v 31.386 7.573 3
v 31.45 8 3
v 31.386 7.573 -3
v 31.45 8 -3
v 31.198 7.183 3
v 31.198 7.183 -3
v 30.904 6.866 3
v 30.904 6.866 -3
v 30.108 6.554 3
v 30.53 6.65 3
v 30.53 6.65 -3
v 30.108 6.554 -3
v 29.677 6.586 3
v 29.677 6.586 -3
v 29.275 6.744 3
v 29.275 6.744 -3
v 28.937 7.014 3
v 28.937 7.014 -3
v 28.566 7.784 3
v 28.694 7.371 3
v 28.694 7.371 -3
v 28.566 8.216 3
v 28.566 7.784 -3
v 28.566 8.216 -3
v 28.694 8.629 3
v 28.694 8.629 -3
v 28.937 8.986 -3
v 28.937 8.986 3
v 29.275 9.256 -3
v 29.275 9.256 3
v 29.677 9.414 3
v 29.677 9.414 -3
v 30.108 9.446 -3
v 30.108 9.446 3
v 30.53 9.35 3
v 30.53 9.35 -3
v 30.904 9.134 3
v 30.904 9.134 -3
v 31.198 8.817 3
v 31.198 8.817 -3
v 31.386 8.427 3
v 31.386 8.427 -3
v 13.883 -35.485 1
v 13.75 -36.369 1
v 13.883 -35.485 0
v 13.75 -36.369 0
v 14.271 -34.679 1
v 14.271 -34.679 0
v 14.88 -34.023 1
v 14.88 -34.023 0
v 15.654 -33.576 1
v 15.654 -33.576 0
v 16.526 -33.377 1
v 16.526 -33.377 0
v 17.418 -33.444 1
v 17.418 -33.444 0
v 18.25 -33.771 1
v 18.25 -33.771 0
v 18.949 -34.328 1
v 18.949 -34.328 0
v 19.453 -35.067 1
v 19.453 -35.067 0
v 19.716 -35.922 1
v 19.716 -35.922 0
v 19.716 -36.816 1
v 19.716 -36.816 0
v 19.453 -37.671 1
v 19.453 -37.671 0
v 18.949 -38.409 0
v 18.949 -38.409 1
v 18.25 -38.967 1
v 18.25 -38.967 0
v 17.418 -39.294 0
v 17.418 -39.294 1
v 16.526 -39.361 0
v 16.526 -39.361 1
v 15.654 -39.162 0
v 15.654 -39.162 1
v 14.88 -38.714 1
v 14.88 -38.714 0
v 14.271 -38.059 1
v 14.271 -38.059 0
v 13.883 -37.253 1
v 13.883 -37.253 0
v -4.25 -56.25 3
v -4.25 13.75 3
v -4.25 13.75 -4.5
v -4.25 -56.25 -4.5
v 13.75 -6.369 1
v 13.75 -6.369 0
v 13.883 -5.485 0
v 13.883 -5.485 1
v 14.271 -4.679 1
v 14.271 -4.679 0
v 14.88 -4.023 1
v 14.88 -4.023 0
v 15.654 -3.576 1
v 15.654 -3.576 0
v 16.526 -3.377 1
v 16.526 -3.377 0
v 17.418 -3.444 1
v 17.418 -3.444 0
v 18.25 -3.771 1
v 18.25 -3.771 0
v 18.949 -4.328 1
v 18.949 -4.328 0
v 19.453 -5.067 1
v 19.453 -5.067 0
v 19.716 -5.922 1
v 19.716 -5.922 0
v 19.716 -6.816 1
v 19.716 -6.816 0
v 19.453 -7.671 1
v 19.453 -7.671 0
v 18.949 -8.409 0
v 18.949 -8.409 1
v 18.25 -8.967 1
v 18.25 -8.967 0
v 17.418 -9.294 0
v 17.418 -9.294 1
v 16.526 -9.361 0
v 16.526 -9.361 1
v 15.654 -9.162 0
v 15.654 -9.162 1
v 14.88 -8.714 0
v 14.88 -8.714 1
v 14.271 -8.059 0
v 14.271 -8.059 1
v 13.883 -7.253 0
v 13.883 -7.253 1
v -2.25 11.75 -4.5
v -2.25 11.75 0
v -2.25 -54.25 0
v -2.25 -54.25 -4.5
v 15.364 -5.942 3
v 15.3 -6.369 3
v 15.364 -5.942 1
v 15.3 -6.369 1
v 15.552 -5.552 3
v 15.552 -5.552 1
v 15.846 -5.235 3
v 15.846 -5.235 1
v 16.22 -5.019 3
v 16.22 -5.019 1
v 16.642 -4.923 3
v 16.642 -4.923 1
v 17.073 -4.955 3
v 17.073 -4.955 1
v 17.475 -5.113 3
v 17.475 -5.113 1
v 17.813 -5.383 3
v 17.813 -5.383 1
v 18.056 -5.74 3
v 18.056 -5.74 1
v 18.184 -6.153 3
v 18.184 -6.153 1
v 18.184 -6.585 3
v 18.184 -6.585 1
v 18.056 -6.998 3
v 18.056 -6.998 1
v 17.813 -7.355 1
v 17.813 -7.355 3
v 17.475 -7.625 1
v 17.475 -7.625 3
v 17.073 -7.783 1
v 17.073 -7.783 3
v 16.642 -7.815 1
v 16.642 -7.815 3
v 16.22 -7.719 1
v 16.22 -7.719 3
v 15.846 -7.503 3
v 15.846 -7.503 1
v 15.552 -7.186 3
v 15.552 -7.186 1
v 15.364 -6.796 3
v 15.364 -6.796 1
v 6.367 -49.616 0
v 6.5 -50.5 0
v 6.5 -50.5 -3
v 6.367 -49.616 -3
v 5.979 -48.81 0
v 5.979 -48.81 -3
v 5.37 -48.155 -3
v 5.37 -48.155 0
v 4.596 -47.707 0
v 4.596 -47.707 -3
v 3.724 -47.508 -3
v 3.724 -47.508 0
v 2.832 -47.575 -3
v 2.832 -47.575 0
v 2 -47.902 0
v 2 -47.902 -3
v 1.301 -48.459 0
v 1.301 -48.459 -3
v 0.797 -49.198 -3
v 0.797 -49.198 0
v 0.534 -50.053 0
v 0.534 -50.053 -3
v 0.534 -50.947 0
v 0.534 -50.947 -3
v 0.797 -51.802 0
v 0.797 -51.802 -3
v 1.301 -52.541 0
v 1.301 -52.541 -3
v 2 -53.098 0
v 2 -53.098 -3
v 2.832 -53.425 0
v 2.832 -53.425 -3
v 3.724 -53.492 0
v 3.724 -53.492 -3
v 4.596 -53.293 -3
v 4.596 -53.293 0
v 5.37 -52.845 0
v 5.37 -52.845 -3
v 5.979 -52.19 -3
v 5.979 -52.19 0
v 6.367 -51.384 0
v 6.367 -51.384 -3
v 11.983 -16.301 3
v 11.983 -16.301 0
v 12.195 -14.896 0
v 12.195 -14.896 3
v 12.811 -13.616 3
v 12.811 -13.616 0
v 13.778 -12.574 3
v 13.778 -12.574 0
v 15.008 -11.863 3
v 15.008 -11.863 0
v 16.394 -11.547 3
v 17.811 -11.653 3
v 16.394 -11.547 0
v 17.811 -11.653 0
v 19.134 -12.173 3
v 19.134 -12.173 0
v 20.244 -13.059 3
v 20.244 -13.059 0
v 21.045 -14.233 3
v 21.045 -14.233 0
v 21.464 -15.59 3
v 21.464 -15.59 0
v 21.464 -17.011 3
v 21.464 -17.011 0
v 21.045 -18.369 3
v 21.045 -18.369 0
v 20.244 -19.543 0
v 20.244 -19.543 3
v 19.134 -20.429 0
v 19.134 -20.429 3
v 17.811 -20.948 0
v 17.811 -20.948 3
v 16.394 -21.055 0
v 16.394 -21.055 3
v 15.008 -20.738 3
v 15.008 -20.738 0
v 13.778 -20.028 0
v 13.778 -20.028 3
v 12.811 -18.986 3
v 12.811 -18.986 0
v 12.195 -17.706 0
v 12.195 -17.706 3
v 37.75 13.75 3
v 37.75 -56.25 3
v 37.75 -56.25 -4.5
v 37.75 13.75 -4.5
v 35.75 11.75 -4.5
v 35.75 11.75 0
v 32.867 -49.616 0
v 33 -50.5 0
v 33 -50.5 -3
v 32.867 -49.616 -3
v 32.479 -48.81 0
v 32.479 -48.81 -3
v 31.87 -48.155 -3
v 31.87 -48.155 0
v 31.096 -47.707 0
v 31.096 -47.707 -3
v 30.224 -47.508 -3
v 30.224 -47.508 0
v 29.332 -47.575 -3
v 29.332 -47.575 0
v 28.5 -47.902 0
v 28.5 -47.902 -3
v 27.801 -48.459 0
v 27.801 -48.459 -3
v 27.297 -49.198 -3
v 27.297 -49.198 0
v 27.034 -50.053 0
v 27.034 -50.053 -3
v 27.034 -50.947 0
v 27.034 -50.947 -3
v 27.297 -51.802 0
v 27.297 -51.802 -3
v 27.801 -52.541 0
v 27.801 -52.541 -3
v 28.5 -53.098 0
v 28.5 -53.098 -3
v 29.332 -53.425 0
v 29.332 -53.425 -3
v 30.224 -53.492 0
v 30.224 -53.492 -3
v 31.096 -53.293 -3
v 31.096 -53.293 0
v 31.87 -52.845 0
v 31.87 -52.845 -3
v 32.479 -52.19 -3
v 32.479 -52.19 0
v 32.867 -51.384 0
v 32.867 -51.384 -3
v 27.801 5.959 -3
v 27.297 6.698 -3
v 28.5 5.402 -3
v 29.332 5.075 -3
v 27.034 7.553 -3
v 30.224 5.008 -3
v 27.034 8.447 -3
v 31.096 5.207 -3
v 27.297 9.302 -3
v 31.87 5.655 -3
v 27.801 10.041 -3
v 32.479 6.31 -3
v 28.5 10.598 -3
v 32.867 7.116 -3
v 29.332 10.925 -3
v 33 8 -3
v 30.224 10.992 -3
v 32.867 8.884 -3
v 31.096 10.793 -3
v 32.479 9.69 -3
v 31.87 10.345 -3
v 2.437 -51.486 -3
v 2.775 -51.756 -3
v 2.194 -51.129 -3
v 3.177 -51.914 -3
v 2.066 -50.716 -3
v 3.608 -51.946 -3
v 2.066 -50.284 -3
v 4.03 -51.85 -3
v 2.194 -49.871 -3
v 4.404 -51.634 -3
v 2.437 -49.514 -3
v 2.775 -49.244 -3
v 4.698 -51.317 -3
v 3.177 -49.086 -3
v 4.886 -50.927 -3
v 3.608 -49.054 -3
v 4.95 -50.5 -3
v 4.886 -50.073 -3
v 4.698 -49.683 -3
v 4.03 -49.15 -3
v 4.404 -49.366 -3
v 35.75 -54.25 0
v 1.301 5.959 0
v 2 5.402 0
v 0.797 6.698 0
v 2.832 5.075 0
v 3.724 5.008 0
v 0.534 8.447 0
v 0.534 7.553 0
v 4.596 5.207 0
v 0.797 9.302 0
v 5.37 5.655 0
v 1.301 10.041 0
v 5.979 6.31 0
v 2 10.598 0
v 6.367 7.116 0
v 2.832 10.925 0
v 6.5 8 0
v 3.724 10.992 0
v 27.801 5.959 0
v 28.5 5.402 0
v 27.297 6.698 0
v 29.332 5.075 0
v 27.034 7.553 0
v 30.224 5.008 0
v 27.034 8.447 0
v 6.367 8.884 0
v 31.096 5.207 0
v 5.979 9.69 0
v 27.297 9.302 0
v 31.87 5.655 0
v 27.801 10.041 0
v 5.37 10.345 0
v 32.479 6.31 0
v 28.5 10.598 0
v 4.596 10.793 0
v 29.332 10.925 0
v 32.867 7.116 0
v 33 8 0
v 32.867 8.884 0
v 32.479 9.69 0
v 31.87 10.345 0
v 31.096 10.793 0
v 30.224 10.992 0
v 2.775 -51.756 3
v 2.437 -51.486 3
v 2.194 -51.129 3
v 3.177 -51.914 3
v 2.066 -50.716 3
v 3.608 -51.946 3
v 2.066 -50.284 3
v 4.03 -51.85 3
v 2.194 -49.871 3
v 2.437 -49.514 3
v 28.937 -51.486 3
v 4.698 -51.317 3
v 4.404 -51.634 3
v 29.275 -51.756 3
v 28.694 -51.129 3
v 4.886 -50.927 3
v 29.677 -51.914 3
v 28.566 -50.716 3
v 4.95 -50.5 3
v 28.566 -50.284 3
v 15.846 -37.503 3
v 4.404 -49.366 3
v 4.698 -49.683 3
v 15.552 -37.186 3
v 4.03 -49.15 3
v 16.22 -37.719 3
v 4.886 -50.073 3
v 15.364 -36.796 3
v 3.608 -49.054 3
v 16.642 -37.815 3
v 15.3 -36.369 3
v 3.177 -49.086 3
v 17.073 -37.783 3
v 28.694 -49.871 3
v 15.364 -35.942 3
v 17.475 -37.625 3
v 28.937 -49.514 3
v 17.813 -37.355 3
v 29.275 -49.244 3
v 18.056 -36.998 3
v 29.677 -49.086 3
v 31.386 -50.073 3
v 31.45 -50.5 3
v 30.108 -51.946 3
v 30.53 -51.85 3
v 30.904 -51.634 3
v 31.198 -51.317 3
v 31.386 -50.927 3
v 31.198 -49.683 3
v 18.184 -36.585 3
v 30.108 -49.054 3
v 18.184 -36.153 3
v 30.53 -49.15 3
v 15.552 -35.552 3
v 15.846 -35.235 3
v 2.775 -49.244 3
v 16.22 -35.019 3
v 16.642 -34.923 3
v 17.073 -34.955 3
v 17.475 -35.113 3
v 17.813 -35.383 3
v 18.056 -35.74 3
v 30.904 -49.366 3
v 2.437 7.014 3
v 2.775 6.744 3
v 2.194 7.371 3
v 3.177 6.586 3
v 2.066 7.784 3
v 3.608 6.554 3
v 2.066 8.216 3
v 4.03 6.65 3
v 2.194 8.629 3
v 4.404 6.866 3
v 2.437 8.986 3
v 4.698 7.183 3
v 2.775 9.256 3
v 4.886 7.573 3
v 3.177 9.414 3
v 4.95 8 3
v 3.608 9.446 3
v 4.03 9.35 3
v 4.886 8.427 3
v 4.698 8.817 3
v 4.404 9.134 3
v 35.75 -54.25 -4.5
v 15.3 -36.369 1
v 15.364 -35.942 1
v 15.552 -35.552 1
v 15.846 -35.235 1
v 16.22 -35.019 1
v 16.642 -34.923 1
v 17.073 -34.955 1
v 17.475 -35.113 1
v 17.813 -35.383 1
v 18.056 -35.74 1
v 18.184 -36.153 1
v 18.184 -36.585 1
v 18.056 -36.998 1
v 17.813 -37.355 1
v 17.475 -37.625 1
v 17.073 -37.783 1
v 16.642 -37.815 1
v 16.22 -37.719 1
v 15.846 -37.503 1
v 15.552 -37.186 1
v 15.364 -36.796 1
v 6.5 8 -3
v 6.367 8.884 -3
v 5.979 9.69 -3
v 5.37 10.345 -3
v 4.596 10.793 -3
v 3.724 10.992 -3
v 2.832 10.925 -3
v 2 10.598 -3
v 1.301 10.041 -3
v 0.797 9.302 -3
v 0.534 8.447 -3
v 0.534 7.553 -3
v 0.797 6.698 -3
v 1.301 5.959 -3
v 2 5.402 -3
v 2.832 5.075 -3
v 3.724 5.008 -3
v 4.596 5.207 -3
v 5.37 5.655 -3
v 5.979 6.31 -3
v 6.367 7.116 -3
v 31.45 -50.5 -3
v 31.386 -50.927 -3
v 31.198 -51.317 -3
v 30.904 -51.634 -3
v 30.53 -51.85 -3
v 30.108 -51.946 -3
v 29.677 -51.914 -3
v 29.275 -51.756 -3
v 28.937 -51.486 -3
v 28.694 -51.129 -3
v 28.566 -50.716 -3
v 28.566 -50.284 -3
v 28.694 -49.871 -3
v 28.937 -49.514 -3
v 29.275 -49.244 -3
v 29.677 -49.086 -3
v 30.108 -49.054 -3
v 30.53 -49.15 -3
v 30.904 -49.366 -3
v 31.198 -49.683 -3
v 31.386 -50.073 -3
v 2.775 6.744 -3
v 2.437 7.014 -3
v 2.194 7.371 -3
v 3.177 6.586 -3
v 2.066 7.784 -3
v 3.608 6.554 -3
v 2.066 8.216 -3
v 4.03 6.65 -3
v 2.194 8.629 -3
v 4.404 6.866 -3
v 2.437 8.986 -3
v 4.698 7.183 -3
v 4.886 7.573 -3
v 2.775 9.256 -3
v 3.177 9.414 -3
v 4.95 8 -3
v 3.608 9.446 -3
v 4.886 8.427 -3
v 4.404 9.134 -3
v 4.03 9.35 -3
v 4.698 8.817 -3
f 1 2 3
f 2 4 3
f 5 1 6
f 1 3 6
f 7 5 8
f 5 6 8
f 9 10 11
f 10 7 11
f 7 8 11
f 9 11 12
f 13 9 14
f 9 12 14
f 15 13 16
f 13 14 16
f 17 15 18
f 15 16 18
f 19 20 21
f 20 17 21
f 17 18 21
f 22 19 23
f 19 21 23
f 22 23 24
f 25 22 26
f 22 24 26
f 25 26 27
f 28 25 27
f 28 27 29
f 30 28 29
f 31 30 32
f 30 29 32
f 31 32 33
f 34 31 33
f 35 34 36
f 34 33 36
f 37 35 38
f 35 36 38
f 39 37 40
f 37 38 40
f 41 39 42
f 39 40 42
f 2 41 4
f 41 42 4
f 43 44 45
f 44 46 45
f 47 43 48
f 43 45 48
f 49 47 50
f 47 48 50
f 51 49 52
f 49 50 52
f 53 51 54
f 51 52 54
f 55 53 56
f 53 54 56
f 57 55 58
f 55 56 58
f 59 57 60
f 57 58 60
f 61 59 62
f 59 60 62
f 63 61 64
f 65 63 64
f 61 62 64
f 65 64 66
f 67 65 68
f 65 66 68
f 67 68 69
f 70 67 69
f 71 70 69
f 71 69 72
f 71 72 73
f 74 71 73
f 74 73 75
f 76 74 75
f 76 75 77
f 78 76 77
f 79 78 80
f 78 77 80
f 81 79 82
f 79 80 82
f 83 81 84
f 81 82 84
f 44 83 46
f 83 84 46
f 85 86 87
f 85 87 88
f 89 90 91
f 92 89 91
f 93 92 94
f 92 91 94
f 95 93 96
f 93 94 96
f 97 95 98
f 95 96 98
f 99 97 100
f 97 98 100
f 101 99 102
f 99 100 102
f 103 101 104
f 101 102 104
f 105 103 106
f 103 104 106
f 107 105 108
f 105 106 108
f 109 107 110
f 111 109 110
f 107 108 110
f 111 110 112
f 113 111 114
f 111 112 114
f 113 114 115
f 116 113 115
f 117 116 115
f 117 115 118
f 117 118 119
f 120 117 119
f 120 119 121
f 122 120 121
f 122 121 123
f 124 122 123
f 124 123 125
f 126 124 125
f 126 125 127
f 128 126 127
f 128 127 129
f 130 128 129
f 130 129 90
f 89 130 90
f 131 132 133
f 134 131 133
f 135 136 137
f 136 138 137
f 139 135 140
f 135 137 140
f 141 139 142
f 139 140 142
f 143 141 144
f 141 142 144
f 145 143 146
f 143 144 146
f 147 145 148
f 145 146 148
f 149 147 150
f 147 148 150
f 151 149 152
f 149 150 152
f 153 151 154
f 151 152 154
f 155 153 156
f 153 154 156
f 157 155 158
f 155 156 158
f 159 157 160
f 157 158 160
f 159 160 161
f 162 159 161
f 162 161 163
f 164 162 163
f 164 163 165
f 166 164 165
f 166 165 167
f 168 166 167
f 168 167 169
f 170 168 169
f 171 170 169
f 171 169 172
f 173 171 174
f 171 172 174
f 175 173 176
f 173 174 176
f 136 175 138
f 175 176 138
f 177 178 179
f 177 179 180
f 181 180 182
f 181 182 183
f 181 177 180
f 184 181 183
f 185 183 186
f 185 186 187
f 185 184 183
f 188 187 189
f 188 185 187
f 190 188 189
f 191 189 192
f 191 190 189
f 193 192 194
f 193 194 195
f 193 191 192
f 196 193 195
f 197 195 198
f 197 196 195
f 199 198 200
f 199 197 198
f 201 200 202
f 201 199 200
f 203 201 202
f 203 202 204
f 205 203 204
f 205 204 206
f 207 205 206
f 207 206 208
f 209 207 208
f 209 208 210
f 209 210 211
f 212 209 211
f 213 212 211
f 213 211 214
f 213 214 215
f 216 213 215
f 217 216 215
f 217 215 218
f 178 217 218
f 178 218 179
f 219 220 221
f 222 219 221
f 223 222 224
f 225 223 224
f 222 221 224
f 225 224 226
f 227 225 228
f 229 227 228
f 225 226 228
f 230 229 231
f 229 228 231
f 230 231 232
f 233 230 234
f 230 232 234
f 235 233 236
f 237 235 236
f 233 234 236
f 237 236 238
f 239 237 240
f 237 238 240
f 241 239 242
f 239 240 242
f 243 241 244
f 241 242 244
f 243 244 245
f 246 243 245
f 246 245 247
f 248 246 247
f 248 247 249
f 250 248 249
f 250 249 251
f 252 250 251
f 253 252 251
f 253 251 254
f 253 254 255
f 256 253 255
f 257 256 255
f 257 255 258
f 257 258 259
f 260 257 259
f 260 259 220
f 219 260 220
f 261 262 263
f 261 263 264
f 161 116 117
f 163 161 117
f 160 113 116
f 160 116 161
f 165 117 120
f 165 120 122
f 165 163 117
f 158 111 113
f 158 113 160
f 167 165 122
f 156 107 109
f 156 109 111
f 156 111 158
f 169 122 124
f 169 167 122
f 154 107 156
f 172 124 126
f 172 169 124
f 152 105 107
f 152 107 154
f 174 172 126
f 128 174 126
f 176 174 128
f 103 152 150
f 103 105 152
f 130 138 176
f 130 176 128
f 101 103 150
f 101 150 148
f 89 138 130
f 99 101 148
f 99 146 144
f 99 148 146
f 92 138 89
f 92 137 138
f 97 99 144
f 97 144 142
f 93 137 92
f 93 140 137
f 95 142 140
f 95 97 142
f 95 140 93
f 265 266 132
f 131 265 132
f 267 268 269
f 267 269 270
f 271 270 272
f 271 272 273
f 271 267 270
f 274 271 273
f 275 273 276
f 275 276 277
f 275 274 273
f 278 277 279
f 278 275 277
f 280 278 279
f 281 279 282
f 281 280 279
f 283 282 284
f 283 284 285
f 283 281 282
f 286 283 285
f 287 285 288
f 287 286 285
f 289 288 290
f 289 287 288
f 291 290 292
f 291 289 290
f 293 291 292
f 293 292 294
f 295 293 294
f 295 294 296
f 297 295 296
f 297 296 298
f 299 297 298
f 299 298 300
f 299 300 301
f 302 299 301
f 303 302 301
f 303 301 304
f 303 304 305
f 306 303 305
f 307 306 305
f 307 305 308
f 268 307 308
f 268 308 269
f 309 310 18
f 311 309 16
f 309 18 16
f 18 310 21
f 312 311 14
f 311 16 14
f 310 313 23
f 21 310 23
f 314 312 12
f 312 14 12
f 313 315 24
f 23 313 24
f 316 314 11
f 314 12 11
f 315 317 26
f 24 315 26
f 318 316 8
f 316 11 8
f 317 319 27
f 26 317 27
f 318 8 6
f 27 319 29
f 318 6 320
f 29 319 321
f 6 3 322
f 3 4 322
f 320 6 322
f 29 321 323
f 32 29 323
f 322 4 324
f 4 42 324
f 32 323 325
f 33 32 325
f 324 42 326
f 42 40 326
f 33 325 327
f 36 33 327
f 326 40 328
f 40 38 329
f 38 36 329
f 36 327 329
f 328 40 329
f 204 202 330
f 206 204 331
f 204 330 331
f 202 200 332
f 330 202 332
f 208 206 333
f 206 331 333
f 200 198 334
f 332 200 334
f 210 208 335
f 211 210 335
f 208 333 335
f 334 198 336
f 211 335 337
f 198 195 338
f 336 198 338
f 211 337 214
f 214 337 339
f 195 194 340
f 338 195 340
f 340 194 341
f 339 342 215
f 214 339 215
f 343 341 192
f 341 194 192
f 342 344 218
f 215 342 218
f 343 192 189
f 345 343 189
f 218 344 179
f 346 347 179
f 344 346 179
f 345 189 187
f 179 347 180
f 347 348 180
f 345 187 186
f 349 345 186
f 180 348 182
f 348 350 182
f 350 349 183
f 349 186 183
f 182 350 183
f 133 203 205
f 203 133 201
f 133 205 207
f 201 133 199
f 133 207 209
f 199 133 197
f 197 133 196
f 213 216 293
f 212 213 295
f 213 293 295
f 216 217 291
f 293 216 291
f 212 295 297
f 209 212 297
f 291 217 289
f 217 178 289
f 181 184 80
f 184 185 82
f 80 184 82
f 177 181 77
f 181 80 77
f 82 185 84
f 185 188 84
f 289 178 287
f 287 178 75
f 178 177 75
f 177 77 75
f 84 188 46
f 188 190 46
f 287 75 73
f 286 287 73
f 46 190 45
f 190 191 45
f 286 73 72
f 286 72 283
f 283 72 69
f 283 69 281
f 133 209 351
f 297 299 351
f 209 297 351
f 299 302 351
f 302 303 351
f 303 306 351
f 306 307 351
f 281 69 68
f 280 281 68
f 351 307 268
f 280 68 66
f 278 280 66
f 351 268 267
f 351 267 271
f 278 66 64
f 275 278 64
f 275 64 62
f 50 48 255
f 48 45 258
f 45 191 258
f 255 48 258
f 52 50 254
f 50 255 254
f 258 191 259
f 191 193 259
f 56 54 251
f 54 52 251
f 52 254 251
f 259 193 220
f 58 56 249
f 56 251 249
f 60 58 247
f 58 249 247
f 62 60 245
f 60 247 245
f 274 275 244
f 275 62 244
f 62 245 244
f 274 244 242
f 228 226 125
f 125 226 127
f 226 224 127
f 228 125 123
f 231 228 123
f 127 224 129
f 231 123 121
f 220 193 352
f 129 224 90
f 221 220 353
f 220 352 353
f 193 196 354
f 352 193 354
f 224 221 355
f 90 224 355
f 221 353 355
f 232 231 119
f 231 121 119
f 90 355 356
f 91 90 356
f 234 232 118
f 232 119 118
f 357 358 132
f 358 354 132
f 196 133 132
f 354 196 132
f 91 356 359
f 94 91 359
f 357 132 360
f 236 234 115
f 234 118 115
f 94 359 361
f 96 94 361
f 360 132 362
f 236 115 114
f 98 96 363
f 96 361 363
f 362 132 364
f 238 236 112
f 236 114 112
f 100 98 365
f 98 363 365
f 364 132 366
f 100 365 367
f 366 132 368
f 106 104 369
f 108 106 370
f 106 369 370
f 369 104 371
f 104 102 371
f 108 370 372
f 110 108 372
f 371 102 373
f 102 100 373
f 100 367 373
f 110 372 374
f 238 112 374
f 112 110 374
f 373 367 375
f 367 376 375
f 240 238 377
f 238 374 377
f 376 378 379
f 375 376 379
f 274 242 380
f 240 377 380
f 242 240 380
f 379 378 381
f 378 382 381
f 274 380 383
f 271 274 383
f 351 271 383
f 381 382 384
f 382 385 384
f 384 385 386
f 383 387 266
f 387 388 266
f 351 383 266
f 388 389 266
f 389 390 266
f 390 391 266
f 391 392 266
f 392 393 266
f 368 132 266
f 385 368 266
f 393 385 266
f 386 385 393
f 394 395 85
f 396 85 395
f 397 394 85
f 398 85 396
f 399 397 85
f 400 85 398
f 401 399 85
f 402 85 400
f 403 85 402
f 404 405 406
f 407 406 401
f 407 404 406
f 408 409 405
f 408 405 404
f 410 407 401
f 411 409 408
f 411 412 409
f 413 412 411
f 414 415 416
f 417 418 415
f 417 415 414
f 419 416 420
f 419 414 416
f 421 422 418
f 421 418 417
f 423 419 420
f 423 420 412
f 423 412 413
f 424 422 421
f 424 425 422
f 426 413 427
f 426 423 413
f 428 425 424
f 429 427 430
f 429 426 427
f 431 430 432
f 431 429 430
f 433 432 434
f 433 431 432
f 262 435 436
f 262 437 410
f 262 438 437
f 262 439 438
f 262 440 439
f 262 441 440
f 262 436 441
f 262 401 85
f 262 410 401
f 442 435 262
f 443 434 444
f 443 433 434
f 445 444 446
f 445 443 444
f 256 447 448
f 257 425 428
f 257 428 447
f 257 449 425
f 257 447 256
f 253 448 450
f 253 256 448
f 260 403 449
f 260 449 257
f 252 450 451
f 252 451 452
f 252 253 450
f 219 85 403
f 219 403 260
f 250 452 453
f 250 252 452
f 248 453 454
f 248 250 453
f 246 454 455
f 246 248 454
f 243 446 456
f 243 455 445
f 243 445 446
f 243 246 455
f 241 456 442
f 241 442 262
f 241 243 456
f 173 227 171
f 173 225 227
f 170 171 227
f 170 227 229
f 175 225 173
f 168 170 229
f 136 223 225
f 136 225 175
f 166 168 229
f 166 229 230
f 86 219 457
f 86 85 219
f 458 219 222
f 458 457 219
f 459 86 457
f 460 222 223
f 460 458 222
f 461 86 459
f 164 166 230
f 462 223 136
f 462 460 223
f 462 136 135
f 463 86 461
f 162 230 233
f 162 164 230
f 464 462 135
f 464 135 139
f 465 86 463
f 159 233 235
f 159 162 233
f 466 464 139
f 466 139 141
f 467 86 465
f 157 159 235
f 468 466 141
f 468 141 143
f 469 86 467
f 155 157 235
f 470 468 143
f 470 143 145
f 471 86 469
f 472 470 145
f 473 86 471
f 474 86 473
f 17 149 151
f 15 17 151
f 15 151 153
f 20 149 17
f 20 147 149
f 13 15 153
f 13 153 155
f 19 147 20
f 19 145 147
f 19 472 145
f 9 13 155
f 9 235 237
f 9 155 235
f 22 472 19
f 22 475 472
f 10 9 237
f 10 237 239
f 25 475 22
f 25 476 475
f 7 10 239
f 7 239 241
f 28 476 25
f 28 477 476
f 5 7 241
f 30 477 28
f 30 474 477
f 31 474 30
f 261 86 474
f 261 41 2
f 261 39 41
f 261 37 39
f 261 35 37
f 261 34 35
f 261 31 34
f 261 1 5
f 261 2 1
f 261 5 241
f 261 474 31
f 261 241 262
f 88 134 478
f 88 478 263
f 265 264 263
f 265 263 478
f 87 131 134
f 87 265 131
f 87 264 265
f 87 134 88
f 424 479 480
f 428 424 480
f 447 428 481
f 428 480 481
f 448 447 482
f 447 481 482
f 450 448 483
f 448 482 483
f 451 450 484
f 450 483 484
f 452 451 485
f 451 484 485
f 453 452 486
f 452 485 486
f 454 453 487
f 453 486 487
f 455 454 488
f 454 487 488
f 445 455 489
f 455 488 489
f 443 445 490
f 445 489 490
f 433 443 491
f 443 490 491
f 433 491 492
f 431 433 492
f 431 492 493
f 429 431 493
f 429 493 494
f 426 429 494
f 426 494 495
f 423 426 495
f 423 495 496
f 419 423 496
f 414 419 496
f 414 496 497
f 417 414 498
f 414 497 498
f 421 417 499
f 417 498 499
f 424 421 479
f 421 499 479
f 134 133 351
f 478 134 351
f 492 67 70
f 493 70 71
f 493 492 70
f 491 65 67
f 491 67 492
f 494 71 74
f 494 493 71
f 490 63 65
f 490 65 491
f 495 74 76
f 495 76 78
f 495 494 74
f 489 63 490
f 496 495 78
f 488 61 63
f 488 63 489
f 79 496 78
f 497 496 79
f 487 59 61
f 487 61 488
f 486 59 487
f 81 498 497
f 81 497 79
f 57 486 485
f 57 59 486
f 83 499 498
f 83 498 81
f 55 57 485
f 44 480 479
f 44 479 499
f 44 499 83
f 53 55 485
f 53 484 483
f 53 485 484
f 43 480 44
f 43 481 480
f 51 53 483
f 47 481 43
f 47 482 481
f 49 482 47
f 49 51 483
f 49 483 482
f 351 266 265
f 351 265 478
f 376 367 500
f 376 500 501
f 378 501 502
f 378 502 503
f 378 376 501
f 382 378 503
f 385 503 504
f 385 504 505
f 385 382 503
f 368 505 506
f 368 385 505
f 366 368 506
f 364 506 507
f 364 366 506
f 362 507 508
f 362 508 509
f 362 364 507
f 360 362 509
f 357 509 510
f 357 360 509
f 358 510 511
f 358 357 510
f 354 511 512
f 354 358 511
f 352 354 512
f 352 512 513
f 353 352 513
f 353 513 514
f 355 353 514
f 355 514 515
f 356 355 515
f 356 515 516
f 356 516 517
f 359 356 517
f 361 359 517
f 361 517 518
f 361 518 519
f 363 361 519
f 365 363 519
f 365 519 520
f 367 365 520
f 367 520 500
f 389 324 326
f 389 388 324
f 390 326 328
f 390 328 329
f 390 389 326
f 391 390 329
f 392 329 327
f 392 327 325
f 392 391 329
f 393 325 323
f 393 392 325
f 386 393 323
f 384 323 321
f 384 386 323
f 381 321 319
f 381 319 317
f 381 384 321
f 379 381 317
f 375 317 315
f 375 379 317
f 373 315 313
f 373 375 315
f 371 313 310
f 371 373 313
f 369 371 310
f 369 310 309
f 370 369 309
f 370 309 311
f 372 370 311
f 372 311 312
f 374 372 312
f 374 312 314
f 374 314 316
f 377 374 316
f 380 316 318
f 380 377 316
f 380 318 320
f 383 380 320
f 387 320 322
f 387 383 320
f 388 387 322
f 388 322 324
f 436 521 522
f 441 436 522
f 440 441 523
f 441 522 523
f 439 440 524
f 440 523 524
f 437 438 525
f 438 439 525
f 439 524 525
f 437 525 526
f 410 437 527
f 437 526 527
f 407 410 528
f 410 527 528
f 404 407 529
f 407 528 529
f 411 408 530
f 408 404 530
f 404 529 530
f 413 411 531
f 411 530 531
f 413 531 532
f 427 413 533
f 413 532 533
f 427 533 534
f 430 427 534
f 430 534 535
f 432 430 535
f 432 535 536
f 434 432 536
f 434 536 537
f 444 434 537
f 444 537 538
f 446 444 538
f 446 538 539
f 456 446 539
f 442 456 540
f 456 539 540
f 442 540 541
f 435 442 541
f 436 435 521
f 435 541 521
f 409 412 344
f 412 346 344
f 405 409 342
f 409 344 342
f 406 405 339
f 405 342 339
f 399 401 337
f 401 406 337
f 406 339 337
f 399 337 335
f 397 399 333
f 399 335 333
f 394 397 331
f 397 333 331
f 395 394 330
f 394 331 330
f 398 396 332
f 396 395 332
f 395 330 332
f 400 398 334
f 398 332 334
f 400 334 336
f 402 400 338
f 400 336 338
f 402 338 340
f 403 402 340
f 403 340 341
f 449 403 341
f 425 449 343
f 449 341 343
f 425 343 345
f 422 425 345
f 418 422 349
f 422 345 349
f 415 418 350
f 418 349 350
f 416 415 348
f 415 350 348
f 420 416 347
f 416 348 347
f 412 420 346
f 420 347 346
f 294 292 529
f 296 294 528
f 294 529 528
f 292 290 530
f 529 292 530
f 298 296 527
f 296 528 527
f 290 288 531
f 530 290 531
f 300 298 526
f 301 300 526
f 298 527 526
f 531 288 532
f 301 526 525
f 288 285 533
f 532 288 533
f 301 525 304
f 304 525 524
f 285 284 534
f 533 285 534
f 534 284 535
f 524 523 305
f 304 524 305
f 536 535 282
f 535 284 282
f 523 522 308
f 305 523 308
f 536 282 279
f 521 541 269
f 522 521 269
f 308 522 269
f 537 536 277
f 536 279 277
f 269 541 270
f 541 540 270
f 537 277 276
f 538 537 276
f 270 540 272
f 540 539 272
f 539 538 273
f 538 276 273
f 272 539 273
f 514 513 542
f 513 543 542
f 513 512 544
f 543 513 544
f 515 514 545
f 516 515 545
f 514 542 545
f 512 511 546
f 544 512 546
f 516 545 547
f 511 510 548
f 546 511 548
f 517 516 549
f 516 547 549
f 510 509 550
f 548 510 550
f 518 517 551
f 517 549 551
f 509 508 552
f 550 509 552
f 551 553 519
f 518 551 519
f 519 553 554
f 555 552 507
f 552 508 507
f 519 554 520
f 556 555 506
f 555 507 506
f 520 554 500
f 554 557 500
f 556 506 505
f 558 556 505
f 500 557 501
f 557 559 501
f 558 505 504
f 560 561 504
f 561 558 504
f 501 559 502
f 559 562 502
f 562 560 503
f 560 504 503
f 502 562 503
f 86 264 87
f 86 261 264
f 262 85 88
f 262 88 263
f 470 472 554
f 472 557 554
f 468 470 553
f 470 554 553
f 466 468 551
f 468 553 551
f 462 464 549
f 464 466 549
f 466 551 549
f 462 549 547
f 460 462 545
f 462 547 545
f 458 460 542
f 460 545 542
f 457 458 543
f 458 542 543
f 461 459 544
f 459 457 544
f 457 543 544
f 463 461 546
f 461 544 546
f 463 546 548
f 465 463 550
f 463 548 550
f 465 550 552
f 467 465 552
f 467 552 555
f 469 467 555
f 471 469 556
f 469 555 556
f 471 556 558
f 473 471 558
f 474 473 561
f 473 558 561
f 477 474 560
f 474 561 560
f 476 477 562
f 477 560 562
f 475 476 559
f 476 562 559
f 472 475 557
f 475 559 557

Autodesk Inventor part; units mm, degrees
ref_plane "YZ Plane" through (0, 0, 0) normal (1, 0, 0) x (0, 1, 0)
ref_plane "XZ Plane" through (0, 0, 0) normal (0, 1, 0) x (-1, 0, 0)
ref_plane "XY Plane" through (0, 0, 0) normal (0, 0, 1) x (1, 0, 0)
sketch "Sketch1" plane through (0, 0, 0) normal (0, 0, 1) x (1, 0, 0)
  line L0 (-1.75, -53.75) -> (-1.75, 11.25) projected
  line L1 (35.25, -53.75) -> (-1.75, -53.75) projected
  line L2 (35.25, 11.25) -> (35.25, -53.75) projected
  line L3 (-1.75, 11.25) -> (35.25, 11.25) projected
  circle A0 centre (30, 8) radius 3 projected
  circle A1 centre (3.5, -50.5) radius 3 projected
  circle A2 centre (30, -50.5) radius 3 projected
  circle A3 centre (3.5, 8) radius 3 projected
  circle A4 centre (3.5, -50.5) radius 1.45
  circle A5 centre (30, -50.5) radius 1.45
  circle A6 centre (30, 8) radius 1.45
  circle A7 centre (3.5, 8) radius 1.45
  point P0 (0, 0)
  dimension "d0" = 2.9
  dimension "d1" = 2.9
  dimension "d2" = 2.9
  dimension "d3" = 2.9
extrude "Extrusion1" add sketch "Sketch1" along normal blind 3 contours L0 L3 L2 L1 | A0 | A1 | A2 | A3
sketch "Sketch2" plane through (0, 0, 0) normal (0, 0, -1) x (-1, 0, 0)
  line L0 (-35.25, -53.75) -> (-35.25, 11.25) projected
  line L1 (-35.25, 11.25) -> (-35.75, 11.25)
  line L2 (-35.75, 11.25) -> (-37.75, 11.25)
  line L3 (-37.75, 11.25) -> (-37.75, 11.75)
  line L4 (-37.75, 11.75) -> (-37.75, 13.75)
  line L5 (-37.75, 13.75) -> (1.75, 13.75)
  line L6 (1.75, 13.75) -> (2.25, 13.75)
  line L7 (2.25, 13.75) -> (4.25, 13.75)
  line L8 (4.25, 13.75) -> (4.25, -53.75)
  line L9 (4.25, -53.75) -> (4.25, -54.25)
  line L10 (4.25, -54.25) -> (4.25, -56.25)
  line L11 (4.25, -56.25) -> (-35.25, -56.25)
  line L12 (-35.25, -56.25) -> (-37.75, -56.25)
  line L13 (-37.75, -56.25) -> (-37.75, 11.25)
  line L14 (-37.75, 11.75) -> (4.25, 11.75)
  line L15 (1.75, 11.25) -> (1.75, -53.75) projected
  line L16 (1.75, 11.25) -> (1.75, 11.75)
  line L17 (2.25, 13.75) -> (2.25, -56.25)
  line L18 (1.75, -53.75) -> (4.25, -53.75)
  line L19 (4.25, -54.25) -> (-35.25, -54.25)
  line L20 (1.75, -53.75) -> (-35.25, -53.75) projected
  line L21 (-35.25, -54.25) -> (-37.75, -54.25)
  line L22 (-35.25, -53.75) -> (-35.25, -54.25)
  line L23 (-35.75, 11.25) -> (-35.75, -56.25)
  line L24 (-35.25, 11.25) -> (1.75, 11.25) projected
  line L25 (-35.75, 11.25) -> (-35.75, 13.75)
  point P0 (0, 0)
  point P1 (-35.75, -54.25)
  point P2 (-35.75, 11.75)
  point P3 (2.25, 11.75)
  point P4 (2.25, -54.25)
  dimension "d6" = 0.5
  dimension "d7" = 2
  dimension "d8" = 0.5
  dimension "d9" = 2
  dimension "d10" = 0.5
  dimension "d11" = 2
  dimension "d12" = 0.5
  dimension "d13" = 2
extrude "Extrusion2" add sketch "Sketch2" against normal up to surface (3 mm away) contours L22 L21 L23 L1 L0 | L20 L18 L17 L19 L22 | L1 L25 L14 L16 L24 | L15 L16 L14 L17 L18 | L19 L17 L11 L12 L23 L21 | L23 L21 L13 L2 | L2 L3 L14 L25 | L18 L9 L19 L17 | L17 L14 L8 L18 | L19 L10 L11 L17 | L23 L12 L13 L21 | L25 L5 L6 L17 L14 | L14 L4 L5 L25 | L17 L7 L8 L14
extrude "Extrusion3" add sketch "Sketch1" against normal blind 3 contours A0 | A1 | A2 | A3
extrude "Extrusion4" add sketch "Sketch2" along normal blind 4.5 contours L19 L17 L11 L12 L23 L21 | L23 L21 L13 L2 | L2 L3 L14 L25 | L18 L9 L19 L17 | L17 L14 L8 L18 | L19 L10 L11 L17 | L23 L12 L13 L21 | L25 L5 L6 L17 L14 | L14 L4 L5 L25 | L17 L7 L8 L14
sketch "Sketch3" plane through (0, 0, 0) normal (0, 0, -1) x (-1, 0, 0)
  line L0 (-35.75, 11.75) -> (2.25, 11.75) projected
  line L1 (-16.75, 11.75) -> (-16.75, -54.25)
  line L2 (2.25, -54.25) -> (-35.75, -54.25) projected
  circle A0 centre (-16.75, -6.3689) radius 1.45
  circle A1 centre (-16.75, -6.3689) radius 3
  line L3 (-16.75, -6.3689) -> (-16.75, -36.3689)
  circle A2 centre (-16.75, -36.3689) radius 1.45
  circle A3 centre (-16.75, -36.3689) radius 3
  point P0 (0, 0)
  dimension "d20" = 2.9
  dimension "d21" = 6
  dimension "d22" = 30
  dimension "d23" = 2.9
  dimension "d24" = 6
extrude "Extrusion5" cut sketch "Sketch3" against normal up to surface (3 mm away) contours A0 L1 | L1 A0 | A2 L1 | L1 A2
extrude "Extrusion6" cut sketch "Sketch3" against normal blind 1 contours A1 L1 A0 | L1 A0 A1 | A3 L1 A2 | L1 A2 A3
sketch "Sketch4" plane through (0, 0, 0) normal (0, 0, -1) x (-1, 0, 0)
  circle A0 centre (-16.75, -16.3009) radius 4.767
  point P0 (0, 0)
  point P1 (-16.75, -6.3689)
  dimension "d30" = 9.534
extrude "Extrusion7" cut sketch "Sketch4" against normal up to surface (3 mm away)
equation "\"d14\" = d7"
properties part number "converter_case"
